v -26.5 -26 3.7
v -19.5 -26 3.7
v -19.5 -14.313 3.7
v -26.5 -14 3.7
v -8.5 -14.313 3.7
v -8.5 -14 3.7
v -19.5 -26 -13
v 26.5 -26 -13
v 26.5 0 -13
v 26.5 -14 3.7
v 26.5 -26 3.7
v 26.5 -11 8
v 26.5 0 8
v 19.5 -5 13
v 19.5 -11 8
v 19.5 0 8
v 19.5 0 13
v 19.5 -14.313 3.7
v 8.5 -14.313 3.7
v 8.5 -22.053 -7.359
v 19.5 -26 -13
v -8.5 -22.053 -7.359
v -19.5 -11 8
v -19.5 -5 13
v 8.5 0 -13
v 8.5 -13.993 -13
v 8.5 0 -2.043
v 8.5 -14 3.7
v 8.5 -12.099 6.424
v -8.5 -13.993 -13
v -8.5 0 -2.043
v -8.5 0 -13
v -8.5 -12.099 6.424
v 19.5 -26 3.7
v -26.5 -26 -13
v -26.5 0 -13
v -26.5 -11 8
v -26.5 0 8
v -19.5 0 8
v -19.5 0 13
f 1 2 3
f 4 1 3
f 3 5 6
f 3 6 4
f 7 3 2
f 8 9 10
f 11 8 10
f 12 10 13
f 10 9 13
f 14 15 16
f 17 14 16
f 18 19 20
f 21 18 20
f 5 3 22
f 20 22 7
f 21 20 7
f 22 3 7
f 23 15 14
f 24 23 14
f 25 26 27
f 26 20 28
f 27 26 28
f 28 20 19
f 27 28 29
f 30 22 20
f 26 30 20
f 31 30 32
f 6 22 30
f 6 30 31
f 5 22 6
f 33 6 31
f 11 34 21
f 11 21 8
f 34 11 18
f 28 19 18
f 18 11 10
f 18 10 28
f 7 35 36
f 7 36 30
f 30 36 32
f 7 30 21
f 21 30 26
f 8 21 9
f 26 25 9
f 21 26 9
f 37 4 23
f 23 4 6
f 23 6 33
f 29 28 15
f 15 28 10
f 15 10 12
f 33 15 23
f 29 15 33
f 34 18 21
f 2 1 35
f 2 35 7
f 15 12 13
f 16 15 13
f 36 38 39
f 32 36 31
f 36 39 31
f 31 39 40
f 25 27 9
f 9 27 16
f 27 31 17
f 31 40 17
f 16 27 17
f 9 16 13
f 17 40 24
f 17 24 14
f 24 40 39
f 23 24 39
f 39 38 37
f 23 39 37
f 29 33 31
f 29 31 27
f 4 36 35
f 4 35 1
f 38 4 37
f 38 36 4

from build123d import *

# Parameters (mm, degrees)
F0_W      = 53
F0_H      = 26
F1_DEPTH  = 26
F2_W      = 11
F2_H      = 5
F3_DEPTH  = 7
F4_W      = 11
F4_H      = 5
F5_DEPTH  = 7
F7_DEPTH  = 53.001
F9_DEPTH  = 46.001
F12_DEPTH = 39
F14_W     = 17
F14_H     = 17
F15_DEPTH = 21.3027613393
F16_DEPTH = 39


with BuildPart() as f1:
    # F0 (on Front) → F1 (new body)
    with BuildSketch(Plane.XZ):
        Rectangle(F0_W, F0_H)
    extrude(amount=F1_DEPTH)

    # F2 (on face) → F3 (cut)
    with BuildSketch(Plane.YZ.offset(26.5)):
        with Locations((-5.5, 10.5)):
            Rectangle(F2_W, F2_H)
    extrude(amount=-F3_DEPTH, mode=Mode.SUBTRACT)

    # F4 (on face) → F5 (cut)
    with BuildSketch(Plane(origin=(-26.5, 0, 0), x_dir=(0, -1, 0), z_dir=(-1, 0, 0))):
        with Locations((5.5, 10.5)):
            Rectangle(F4_W, F4_H)
    extrude(amount=-F5_DEPTH, mode=Mode.SUBTRACT)

    # F6 (on face) → F7 (cut, through all)
    with BuildSketch(Plane.YZ.offset(26.5)):
        Polygon((-20.9308508784, 13), (-26, 13), (-26, 3.7), (-14, 3.7), (-11, 8), (-11, 13), align=None)
    extrude(amount=-F7_DEPTH, mode=Mode.SUBTRACT)

    # F8 (on face) → F9 (cut, through all)
    with BuildSketch(Plane.YZ.offset(19.5)):
        Polygon((-11, 13), (-11, 8), (-5, 13), align=None)
    extrude(amount=-F9_DEPTH, mode=Mode.SUBTRACT)

    # F11 (on offset) → F12 (cut)
    with BuildSketch(Plane(origin=(-19.5, 0, 0), x_dir=(0, -1, 0), z_dir=(-1, 0, 0))):
        Polygon((26, -13), (26, 3.7961313778), (11.3091202676, 7.9921598434), align=None)
    extrude(amount=-F12_DEPTH, mode=Mode.SUBTRACT)

    # F14 (on offset) → F15 (cut, through all)
    with BuildSketch(Plane(origin=(0, -11.3456357591, 7.9399819584), x_dir=(1, 0, 0), z_dir=(0, -0.8192985131, 0.5733672004))):
        with Locations((0, -10.1738724944)):
            Rectangle(F14_W, F14_H)
    extrude(amount=-F15_DEPTH, mode=Mode.SUBTRACT)

    # F11 (on offset) → F16 (cut)
    with BuildSketch(Plane(origin=(-19.5, 0, 0), x_dir=(0, -1, 0), z_dir=(-1, 0, 0))):
        Polygon((26, -13), (26, 3.7961313778), (11.3091202676, 7.9921598434), align=None)
    extrude(amount=-F16_DEPTH, mode=Mode.SUBTRACT)


solid = f1.part
